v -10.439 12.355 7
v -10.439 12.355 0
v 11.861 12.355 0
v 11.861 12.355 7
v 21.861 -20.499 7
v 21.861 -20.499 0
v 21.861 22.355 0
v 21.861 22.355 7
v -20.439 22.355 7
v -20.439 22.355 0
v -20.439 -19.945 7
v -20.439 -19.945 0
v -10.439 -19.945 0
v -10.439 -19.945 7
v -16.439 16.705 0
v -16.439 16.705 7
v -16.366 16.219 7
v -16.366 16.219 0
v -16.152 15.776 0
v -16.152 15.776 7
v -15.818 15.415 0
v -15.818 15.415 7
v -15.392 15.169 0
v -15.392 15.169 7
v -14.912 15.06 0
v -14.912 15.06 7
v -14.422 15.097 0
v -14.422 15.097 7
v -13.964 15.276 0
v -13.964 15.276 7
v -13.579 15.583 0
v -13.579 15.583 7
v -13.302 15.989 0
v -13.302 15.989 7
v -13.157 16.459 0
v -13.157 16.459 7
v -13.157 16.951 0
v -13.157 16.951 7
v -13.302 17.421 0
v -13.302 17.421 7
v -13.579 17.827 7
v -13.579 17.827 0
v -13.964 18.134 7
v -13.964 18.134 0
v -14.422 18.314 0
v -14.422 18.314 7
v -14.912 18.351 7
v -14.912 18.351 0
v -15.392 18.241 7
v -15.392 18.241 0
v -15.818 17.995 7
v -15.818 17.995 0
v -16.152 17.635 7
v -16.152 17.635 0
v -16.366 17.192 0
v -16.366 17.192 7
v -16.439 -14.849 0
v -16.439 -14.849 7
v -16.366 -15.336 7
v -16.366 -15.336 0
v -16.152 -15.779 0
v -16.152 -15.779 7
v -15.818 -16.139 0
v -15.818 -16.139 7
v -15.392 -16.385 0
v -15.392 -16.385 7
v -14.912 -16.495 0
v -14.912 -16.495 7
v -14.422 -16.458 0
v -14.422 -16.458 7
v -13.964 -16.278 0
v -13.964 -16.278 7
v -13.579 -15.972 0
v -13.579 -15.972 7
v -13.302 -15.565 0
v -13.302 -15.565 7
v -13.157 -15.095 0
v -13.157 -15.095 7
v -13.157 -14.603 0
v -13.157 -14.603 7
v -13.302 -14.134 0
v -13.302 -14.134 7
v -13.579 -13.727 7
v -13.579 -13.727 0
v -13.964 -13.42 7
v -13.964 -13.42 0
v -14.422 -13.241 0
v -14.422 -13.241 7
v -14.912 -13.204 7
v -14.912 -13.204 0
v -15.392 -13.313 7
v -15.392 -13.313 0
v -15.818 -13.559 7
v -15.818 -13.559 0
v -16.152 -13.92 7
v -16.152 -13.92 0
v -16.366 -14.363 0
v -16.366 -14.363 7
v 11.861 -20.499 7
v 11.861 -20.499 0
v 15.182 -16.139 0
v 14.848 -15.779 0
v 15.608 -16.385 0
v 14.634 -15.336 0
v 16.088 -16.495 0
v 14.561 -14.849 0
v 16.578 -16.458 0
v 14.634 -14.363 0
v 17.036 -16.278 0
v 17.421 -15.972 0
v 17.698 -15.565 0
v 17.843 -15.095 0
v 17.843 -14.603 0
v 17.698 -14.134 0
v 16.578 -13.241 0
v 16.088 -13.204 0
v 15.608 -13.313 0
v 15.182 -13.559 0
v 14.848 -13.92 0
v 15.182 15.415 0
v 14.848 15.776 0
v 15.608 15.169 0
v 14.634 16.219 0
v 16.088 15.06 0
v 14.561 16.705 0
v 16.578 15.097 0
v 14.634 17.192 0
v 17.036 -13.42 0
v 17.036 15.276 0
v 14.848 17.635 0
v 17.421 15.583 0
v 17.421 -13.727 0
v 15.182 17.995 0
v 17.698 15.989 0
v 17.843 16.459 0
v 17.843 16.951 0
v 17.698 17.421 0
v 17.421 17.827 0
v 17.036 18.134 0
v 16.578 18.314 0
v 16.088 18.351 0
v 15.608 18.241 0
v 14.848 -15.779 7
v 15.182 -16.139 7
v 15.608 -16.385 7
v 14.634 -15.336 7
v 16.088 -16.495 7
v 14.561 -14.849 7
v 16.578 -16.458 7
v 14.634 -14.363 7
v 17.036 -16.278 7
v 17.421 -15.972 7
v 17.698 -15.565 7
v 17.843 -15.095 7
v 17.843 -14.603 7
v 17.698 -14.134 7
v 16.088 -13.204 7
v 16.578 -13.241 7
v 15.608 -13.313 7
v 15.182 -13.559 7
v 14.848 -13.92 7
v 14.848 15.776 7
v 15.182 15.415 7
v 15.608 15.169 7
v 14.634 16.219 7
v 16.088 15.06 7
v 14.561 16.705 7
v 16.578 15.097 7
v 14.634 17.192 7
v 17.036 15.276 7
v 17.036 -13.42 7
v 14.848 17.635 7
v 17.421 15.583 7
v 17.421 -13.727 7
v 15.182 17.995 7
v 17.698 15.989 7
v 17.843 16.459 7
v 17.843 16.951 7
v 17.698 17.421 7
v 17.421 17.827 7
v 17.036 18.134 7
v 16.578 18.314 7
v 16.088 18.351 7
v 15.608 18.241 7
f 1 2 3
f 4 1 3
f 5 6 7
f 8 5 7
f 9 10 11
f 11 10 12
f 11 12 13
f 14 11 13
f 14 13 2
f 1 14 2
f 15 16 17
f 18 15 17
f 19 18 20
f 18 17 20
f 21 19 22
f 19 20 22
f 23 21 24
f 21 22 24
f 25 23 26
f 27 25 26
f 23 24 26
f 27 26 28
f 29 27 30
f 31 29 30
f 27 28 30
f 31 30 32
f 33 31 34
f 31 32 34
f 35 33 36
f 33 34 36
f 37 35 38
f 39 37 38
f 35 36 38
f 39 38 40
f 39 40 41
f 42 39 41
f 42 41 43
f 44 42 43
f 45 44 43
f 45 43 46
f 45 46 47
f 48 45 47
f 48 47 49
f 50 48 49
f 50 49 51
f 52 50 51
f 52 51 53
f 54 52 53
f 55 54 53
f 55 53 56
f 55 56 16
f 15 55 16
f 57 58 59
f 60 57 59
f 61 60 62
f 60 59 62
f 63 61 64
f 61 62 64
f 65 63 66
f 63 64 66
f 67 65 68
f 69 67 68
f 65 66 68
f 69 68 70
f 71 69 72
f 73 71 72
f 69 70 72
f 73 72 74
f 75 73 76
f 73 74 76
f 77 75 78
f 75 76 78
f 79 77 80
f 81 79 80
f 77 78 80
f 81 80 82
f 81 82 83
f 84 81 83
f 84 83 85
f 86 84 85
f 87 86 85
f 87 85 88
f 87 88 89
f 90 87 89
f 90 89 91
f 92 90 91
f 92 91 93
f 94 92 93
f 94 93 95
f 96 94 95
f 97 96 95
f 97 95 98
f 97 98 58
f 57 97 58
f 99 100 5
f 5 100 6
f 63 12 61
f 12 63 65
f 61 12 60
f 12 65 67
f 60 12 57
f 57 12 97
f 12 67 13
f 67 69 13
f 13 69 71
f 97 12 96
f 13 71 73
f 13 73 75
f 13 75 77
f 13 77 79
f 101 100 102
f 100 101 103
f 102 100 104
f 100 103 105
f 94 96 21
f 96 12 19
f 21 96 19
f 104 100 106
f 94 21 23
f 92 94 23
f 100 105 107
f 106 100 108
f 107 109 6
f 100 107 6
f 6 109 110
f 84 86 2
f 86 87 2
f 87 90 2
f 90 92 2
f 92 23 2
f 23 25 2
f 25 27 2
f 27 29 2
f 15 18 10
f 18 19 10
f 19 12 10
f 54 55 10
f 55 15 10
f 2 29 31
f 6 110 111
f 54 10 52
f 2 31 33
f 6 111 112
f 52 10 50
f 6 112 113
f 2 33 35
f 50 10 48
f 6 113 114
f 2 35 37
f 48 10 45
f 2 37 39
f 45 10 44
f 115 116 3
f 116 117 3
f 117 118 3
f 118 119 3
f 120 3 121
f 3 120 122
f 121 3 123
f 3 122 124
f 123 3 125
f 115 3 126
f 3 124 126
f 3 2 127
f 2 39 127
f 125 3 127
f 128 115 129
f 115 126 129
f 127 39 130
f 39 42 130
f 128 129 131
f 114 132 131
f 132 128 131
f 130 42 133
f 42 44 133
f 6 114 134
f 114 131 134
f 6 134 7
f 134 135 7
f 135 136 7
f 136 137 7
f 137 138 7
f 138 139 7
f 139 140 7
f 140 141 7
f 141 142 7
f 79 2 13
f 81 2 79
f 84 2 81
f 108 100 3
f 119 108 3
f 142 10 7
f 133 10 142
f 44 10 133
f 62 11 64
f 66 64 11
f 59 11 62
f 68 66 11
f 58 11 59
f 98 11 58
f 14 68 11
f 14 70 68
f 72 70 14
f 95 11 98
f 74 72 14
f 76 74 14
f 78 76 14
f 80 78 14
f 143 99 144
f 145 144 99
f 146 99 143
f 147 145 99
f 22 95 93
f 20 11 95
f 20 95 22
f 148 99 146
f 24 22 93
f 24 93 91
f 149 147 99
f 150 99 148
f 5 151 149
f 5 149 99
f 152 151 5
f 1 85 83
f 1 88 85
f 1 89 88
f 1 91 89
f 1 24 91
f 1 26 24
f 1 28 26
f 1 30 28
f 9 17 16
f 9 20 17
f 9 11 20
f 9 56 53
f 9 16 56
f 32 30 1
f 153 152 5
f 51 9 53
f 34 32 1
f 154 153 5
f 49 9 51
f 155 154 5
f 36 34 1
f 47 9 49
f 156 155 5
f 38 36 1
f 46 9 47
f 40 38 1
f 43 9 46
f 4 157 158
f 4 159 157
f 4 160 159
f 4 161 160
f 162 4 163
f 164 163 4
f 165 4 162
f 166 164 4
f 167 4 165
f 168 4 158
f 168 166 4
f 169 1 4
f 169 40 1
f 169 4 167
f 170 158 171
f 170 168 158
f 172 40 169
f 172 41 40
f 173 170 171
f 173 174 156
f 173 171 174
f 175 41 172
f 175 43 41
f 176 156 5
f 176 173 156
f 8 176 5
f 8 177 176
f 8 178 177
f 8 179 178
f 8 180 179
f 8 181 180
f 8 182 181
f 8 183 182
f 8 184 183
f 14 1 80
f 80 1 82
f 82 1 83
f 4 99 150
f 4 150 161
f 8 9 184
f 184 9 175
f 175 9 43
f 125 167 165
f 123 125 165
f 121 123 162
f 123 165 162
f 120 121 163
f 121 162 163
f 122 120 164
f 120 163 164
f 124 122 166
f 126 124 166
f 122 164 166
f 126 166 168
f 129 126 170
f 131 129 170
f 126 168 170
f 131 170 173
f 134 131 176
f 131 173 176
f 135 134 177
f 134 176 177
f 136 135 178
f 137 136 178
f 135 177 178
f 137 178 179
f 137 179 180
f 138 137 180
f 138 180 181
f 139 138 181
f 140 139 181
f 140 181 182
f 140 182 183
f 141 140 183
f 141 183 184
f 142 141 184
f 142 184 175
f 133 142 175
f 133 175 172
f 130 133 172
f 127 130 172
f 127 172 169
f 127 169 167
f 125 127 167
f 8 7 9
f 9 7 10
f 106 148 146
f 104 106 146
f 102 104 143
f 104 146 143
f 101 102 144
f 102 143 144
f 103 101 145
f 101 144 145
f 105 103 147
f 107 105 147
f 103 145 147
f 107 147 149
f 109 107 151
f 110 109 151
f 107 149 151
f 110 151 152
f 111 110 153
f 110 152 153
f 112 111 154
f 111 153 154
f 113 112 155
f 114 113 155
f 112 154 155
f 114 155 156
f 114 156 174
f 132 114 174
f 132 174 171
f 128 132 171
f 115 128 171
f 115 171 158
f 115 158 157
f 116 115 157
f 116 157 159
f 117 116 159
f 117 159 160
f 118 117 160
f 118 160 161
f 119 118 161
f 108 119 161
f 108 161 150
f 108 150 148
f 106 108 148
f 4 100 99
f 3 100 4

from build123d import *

# Parameters (mm, degrees)
F0_W     = 10
F0_H     = 10
F0_W_2   = 22.3
F0_H_2   = 32.3
F0_H_3   = 32.8545699317
F1_DEPTH = 7
F2_D     = 3.3


with BuildPart() as f1:
    # F0 (on Top) → F1 (new body)
    with BuildSketch(Plane.XY):
        with Locations((-15.4388597772, 17.3551567454)):
            Rectangle(F0_W, F0_H)
        with Locations((0.7111402228, 17.3551567454)):
            Rectangle(F0_W_2, F0_H)
        with Locations((-15.4388597772, -3.7948432546)):
            Rectangle(F0_W, F0_H_2)
        with Locations((16.8611402228, 17.3551567454)):
            Rectangle(F0_W, F0_H)
        with Locations((16.8611402228, -4.0721282204)):
            Rectangle(F0_W, F0_H_3)
    extrude(amount=F1_DEPTH)

    # F2 (through all)
    with Locations(Plane(origin=(0, 0, 0), x_dir=(1, 0, 0), z_dir=(0, 0, -1))):
        with Locations((-14.7888597772, -16.7051567454), (16.2111402228, -16.7051567454), (-14.7888597772, 14.8494131863), (16.2111402228, 14.8494131863)):
            Hole(F2_D / 2)


solid = f1.part
